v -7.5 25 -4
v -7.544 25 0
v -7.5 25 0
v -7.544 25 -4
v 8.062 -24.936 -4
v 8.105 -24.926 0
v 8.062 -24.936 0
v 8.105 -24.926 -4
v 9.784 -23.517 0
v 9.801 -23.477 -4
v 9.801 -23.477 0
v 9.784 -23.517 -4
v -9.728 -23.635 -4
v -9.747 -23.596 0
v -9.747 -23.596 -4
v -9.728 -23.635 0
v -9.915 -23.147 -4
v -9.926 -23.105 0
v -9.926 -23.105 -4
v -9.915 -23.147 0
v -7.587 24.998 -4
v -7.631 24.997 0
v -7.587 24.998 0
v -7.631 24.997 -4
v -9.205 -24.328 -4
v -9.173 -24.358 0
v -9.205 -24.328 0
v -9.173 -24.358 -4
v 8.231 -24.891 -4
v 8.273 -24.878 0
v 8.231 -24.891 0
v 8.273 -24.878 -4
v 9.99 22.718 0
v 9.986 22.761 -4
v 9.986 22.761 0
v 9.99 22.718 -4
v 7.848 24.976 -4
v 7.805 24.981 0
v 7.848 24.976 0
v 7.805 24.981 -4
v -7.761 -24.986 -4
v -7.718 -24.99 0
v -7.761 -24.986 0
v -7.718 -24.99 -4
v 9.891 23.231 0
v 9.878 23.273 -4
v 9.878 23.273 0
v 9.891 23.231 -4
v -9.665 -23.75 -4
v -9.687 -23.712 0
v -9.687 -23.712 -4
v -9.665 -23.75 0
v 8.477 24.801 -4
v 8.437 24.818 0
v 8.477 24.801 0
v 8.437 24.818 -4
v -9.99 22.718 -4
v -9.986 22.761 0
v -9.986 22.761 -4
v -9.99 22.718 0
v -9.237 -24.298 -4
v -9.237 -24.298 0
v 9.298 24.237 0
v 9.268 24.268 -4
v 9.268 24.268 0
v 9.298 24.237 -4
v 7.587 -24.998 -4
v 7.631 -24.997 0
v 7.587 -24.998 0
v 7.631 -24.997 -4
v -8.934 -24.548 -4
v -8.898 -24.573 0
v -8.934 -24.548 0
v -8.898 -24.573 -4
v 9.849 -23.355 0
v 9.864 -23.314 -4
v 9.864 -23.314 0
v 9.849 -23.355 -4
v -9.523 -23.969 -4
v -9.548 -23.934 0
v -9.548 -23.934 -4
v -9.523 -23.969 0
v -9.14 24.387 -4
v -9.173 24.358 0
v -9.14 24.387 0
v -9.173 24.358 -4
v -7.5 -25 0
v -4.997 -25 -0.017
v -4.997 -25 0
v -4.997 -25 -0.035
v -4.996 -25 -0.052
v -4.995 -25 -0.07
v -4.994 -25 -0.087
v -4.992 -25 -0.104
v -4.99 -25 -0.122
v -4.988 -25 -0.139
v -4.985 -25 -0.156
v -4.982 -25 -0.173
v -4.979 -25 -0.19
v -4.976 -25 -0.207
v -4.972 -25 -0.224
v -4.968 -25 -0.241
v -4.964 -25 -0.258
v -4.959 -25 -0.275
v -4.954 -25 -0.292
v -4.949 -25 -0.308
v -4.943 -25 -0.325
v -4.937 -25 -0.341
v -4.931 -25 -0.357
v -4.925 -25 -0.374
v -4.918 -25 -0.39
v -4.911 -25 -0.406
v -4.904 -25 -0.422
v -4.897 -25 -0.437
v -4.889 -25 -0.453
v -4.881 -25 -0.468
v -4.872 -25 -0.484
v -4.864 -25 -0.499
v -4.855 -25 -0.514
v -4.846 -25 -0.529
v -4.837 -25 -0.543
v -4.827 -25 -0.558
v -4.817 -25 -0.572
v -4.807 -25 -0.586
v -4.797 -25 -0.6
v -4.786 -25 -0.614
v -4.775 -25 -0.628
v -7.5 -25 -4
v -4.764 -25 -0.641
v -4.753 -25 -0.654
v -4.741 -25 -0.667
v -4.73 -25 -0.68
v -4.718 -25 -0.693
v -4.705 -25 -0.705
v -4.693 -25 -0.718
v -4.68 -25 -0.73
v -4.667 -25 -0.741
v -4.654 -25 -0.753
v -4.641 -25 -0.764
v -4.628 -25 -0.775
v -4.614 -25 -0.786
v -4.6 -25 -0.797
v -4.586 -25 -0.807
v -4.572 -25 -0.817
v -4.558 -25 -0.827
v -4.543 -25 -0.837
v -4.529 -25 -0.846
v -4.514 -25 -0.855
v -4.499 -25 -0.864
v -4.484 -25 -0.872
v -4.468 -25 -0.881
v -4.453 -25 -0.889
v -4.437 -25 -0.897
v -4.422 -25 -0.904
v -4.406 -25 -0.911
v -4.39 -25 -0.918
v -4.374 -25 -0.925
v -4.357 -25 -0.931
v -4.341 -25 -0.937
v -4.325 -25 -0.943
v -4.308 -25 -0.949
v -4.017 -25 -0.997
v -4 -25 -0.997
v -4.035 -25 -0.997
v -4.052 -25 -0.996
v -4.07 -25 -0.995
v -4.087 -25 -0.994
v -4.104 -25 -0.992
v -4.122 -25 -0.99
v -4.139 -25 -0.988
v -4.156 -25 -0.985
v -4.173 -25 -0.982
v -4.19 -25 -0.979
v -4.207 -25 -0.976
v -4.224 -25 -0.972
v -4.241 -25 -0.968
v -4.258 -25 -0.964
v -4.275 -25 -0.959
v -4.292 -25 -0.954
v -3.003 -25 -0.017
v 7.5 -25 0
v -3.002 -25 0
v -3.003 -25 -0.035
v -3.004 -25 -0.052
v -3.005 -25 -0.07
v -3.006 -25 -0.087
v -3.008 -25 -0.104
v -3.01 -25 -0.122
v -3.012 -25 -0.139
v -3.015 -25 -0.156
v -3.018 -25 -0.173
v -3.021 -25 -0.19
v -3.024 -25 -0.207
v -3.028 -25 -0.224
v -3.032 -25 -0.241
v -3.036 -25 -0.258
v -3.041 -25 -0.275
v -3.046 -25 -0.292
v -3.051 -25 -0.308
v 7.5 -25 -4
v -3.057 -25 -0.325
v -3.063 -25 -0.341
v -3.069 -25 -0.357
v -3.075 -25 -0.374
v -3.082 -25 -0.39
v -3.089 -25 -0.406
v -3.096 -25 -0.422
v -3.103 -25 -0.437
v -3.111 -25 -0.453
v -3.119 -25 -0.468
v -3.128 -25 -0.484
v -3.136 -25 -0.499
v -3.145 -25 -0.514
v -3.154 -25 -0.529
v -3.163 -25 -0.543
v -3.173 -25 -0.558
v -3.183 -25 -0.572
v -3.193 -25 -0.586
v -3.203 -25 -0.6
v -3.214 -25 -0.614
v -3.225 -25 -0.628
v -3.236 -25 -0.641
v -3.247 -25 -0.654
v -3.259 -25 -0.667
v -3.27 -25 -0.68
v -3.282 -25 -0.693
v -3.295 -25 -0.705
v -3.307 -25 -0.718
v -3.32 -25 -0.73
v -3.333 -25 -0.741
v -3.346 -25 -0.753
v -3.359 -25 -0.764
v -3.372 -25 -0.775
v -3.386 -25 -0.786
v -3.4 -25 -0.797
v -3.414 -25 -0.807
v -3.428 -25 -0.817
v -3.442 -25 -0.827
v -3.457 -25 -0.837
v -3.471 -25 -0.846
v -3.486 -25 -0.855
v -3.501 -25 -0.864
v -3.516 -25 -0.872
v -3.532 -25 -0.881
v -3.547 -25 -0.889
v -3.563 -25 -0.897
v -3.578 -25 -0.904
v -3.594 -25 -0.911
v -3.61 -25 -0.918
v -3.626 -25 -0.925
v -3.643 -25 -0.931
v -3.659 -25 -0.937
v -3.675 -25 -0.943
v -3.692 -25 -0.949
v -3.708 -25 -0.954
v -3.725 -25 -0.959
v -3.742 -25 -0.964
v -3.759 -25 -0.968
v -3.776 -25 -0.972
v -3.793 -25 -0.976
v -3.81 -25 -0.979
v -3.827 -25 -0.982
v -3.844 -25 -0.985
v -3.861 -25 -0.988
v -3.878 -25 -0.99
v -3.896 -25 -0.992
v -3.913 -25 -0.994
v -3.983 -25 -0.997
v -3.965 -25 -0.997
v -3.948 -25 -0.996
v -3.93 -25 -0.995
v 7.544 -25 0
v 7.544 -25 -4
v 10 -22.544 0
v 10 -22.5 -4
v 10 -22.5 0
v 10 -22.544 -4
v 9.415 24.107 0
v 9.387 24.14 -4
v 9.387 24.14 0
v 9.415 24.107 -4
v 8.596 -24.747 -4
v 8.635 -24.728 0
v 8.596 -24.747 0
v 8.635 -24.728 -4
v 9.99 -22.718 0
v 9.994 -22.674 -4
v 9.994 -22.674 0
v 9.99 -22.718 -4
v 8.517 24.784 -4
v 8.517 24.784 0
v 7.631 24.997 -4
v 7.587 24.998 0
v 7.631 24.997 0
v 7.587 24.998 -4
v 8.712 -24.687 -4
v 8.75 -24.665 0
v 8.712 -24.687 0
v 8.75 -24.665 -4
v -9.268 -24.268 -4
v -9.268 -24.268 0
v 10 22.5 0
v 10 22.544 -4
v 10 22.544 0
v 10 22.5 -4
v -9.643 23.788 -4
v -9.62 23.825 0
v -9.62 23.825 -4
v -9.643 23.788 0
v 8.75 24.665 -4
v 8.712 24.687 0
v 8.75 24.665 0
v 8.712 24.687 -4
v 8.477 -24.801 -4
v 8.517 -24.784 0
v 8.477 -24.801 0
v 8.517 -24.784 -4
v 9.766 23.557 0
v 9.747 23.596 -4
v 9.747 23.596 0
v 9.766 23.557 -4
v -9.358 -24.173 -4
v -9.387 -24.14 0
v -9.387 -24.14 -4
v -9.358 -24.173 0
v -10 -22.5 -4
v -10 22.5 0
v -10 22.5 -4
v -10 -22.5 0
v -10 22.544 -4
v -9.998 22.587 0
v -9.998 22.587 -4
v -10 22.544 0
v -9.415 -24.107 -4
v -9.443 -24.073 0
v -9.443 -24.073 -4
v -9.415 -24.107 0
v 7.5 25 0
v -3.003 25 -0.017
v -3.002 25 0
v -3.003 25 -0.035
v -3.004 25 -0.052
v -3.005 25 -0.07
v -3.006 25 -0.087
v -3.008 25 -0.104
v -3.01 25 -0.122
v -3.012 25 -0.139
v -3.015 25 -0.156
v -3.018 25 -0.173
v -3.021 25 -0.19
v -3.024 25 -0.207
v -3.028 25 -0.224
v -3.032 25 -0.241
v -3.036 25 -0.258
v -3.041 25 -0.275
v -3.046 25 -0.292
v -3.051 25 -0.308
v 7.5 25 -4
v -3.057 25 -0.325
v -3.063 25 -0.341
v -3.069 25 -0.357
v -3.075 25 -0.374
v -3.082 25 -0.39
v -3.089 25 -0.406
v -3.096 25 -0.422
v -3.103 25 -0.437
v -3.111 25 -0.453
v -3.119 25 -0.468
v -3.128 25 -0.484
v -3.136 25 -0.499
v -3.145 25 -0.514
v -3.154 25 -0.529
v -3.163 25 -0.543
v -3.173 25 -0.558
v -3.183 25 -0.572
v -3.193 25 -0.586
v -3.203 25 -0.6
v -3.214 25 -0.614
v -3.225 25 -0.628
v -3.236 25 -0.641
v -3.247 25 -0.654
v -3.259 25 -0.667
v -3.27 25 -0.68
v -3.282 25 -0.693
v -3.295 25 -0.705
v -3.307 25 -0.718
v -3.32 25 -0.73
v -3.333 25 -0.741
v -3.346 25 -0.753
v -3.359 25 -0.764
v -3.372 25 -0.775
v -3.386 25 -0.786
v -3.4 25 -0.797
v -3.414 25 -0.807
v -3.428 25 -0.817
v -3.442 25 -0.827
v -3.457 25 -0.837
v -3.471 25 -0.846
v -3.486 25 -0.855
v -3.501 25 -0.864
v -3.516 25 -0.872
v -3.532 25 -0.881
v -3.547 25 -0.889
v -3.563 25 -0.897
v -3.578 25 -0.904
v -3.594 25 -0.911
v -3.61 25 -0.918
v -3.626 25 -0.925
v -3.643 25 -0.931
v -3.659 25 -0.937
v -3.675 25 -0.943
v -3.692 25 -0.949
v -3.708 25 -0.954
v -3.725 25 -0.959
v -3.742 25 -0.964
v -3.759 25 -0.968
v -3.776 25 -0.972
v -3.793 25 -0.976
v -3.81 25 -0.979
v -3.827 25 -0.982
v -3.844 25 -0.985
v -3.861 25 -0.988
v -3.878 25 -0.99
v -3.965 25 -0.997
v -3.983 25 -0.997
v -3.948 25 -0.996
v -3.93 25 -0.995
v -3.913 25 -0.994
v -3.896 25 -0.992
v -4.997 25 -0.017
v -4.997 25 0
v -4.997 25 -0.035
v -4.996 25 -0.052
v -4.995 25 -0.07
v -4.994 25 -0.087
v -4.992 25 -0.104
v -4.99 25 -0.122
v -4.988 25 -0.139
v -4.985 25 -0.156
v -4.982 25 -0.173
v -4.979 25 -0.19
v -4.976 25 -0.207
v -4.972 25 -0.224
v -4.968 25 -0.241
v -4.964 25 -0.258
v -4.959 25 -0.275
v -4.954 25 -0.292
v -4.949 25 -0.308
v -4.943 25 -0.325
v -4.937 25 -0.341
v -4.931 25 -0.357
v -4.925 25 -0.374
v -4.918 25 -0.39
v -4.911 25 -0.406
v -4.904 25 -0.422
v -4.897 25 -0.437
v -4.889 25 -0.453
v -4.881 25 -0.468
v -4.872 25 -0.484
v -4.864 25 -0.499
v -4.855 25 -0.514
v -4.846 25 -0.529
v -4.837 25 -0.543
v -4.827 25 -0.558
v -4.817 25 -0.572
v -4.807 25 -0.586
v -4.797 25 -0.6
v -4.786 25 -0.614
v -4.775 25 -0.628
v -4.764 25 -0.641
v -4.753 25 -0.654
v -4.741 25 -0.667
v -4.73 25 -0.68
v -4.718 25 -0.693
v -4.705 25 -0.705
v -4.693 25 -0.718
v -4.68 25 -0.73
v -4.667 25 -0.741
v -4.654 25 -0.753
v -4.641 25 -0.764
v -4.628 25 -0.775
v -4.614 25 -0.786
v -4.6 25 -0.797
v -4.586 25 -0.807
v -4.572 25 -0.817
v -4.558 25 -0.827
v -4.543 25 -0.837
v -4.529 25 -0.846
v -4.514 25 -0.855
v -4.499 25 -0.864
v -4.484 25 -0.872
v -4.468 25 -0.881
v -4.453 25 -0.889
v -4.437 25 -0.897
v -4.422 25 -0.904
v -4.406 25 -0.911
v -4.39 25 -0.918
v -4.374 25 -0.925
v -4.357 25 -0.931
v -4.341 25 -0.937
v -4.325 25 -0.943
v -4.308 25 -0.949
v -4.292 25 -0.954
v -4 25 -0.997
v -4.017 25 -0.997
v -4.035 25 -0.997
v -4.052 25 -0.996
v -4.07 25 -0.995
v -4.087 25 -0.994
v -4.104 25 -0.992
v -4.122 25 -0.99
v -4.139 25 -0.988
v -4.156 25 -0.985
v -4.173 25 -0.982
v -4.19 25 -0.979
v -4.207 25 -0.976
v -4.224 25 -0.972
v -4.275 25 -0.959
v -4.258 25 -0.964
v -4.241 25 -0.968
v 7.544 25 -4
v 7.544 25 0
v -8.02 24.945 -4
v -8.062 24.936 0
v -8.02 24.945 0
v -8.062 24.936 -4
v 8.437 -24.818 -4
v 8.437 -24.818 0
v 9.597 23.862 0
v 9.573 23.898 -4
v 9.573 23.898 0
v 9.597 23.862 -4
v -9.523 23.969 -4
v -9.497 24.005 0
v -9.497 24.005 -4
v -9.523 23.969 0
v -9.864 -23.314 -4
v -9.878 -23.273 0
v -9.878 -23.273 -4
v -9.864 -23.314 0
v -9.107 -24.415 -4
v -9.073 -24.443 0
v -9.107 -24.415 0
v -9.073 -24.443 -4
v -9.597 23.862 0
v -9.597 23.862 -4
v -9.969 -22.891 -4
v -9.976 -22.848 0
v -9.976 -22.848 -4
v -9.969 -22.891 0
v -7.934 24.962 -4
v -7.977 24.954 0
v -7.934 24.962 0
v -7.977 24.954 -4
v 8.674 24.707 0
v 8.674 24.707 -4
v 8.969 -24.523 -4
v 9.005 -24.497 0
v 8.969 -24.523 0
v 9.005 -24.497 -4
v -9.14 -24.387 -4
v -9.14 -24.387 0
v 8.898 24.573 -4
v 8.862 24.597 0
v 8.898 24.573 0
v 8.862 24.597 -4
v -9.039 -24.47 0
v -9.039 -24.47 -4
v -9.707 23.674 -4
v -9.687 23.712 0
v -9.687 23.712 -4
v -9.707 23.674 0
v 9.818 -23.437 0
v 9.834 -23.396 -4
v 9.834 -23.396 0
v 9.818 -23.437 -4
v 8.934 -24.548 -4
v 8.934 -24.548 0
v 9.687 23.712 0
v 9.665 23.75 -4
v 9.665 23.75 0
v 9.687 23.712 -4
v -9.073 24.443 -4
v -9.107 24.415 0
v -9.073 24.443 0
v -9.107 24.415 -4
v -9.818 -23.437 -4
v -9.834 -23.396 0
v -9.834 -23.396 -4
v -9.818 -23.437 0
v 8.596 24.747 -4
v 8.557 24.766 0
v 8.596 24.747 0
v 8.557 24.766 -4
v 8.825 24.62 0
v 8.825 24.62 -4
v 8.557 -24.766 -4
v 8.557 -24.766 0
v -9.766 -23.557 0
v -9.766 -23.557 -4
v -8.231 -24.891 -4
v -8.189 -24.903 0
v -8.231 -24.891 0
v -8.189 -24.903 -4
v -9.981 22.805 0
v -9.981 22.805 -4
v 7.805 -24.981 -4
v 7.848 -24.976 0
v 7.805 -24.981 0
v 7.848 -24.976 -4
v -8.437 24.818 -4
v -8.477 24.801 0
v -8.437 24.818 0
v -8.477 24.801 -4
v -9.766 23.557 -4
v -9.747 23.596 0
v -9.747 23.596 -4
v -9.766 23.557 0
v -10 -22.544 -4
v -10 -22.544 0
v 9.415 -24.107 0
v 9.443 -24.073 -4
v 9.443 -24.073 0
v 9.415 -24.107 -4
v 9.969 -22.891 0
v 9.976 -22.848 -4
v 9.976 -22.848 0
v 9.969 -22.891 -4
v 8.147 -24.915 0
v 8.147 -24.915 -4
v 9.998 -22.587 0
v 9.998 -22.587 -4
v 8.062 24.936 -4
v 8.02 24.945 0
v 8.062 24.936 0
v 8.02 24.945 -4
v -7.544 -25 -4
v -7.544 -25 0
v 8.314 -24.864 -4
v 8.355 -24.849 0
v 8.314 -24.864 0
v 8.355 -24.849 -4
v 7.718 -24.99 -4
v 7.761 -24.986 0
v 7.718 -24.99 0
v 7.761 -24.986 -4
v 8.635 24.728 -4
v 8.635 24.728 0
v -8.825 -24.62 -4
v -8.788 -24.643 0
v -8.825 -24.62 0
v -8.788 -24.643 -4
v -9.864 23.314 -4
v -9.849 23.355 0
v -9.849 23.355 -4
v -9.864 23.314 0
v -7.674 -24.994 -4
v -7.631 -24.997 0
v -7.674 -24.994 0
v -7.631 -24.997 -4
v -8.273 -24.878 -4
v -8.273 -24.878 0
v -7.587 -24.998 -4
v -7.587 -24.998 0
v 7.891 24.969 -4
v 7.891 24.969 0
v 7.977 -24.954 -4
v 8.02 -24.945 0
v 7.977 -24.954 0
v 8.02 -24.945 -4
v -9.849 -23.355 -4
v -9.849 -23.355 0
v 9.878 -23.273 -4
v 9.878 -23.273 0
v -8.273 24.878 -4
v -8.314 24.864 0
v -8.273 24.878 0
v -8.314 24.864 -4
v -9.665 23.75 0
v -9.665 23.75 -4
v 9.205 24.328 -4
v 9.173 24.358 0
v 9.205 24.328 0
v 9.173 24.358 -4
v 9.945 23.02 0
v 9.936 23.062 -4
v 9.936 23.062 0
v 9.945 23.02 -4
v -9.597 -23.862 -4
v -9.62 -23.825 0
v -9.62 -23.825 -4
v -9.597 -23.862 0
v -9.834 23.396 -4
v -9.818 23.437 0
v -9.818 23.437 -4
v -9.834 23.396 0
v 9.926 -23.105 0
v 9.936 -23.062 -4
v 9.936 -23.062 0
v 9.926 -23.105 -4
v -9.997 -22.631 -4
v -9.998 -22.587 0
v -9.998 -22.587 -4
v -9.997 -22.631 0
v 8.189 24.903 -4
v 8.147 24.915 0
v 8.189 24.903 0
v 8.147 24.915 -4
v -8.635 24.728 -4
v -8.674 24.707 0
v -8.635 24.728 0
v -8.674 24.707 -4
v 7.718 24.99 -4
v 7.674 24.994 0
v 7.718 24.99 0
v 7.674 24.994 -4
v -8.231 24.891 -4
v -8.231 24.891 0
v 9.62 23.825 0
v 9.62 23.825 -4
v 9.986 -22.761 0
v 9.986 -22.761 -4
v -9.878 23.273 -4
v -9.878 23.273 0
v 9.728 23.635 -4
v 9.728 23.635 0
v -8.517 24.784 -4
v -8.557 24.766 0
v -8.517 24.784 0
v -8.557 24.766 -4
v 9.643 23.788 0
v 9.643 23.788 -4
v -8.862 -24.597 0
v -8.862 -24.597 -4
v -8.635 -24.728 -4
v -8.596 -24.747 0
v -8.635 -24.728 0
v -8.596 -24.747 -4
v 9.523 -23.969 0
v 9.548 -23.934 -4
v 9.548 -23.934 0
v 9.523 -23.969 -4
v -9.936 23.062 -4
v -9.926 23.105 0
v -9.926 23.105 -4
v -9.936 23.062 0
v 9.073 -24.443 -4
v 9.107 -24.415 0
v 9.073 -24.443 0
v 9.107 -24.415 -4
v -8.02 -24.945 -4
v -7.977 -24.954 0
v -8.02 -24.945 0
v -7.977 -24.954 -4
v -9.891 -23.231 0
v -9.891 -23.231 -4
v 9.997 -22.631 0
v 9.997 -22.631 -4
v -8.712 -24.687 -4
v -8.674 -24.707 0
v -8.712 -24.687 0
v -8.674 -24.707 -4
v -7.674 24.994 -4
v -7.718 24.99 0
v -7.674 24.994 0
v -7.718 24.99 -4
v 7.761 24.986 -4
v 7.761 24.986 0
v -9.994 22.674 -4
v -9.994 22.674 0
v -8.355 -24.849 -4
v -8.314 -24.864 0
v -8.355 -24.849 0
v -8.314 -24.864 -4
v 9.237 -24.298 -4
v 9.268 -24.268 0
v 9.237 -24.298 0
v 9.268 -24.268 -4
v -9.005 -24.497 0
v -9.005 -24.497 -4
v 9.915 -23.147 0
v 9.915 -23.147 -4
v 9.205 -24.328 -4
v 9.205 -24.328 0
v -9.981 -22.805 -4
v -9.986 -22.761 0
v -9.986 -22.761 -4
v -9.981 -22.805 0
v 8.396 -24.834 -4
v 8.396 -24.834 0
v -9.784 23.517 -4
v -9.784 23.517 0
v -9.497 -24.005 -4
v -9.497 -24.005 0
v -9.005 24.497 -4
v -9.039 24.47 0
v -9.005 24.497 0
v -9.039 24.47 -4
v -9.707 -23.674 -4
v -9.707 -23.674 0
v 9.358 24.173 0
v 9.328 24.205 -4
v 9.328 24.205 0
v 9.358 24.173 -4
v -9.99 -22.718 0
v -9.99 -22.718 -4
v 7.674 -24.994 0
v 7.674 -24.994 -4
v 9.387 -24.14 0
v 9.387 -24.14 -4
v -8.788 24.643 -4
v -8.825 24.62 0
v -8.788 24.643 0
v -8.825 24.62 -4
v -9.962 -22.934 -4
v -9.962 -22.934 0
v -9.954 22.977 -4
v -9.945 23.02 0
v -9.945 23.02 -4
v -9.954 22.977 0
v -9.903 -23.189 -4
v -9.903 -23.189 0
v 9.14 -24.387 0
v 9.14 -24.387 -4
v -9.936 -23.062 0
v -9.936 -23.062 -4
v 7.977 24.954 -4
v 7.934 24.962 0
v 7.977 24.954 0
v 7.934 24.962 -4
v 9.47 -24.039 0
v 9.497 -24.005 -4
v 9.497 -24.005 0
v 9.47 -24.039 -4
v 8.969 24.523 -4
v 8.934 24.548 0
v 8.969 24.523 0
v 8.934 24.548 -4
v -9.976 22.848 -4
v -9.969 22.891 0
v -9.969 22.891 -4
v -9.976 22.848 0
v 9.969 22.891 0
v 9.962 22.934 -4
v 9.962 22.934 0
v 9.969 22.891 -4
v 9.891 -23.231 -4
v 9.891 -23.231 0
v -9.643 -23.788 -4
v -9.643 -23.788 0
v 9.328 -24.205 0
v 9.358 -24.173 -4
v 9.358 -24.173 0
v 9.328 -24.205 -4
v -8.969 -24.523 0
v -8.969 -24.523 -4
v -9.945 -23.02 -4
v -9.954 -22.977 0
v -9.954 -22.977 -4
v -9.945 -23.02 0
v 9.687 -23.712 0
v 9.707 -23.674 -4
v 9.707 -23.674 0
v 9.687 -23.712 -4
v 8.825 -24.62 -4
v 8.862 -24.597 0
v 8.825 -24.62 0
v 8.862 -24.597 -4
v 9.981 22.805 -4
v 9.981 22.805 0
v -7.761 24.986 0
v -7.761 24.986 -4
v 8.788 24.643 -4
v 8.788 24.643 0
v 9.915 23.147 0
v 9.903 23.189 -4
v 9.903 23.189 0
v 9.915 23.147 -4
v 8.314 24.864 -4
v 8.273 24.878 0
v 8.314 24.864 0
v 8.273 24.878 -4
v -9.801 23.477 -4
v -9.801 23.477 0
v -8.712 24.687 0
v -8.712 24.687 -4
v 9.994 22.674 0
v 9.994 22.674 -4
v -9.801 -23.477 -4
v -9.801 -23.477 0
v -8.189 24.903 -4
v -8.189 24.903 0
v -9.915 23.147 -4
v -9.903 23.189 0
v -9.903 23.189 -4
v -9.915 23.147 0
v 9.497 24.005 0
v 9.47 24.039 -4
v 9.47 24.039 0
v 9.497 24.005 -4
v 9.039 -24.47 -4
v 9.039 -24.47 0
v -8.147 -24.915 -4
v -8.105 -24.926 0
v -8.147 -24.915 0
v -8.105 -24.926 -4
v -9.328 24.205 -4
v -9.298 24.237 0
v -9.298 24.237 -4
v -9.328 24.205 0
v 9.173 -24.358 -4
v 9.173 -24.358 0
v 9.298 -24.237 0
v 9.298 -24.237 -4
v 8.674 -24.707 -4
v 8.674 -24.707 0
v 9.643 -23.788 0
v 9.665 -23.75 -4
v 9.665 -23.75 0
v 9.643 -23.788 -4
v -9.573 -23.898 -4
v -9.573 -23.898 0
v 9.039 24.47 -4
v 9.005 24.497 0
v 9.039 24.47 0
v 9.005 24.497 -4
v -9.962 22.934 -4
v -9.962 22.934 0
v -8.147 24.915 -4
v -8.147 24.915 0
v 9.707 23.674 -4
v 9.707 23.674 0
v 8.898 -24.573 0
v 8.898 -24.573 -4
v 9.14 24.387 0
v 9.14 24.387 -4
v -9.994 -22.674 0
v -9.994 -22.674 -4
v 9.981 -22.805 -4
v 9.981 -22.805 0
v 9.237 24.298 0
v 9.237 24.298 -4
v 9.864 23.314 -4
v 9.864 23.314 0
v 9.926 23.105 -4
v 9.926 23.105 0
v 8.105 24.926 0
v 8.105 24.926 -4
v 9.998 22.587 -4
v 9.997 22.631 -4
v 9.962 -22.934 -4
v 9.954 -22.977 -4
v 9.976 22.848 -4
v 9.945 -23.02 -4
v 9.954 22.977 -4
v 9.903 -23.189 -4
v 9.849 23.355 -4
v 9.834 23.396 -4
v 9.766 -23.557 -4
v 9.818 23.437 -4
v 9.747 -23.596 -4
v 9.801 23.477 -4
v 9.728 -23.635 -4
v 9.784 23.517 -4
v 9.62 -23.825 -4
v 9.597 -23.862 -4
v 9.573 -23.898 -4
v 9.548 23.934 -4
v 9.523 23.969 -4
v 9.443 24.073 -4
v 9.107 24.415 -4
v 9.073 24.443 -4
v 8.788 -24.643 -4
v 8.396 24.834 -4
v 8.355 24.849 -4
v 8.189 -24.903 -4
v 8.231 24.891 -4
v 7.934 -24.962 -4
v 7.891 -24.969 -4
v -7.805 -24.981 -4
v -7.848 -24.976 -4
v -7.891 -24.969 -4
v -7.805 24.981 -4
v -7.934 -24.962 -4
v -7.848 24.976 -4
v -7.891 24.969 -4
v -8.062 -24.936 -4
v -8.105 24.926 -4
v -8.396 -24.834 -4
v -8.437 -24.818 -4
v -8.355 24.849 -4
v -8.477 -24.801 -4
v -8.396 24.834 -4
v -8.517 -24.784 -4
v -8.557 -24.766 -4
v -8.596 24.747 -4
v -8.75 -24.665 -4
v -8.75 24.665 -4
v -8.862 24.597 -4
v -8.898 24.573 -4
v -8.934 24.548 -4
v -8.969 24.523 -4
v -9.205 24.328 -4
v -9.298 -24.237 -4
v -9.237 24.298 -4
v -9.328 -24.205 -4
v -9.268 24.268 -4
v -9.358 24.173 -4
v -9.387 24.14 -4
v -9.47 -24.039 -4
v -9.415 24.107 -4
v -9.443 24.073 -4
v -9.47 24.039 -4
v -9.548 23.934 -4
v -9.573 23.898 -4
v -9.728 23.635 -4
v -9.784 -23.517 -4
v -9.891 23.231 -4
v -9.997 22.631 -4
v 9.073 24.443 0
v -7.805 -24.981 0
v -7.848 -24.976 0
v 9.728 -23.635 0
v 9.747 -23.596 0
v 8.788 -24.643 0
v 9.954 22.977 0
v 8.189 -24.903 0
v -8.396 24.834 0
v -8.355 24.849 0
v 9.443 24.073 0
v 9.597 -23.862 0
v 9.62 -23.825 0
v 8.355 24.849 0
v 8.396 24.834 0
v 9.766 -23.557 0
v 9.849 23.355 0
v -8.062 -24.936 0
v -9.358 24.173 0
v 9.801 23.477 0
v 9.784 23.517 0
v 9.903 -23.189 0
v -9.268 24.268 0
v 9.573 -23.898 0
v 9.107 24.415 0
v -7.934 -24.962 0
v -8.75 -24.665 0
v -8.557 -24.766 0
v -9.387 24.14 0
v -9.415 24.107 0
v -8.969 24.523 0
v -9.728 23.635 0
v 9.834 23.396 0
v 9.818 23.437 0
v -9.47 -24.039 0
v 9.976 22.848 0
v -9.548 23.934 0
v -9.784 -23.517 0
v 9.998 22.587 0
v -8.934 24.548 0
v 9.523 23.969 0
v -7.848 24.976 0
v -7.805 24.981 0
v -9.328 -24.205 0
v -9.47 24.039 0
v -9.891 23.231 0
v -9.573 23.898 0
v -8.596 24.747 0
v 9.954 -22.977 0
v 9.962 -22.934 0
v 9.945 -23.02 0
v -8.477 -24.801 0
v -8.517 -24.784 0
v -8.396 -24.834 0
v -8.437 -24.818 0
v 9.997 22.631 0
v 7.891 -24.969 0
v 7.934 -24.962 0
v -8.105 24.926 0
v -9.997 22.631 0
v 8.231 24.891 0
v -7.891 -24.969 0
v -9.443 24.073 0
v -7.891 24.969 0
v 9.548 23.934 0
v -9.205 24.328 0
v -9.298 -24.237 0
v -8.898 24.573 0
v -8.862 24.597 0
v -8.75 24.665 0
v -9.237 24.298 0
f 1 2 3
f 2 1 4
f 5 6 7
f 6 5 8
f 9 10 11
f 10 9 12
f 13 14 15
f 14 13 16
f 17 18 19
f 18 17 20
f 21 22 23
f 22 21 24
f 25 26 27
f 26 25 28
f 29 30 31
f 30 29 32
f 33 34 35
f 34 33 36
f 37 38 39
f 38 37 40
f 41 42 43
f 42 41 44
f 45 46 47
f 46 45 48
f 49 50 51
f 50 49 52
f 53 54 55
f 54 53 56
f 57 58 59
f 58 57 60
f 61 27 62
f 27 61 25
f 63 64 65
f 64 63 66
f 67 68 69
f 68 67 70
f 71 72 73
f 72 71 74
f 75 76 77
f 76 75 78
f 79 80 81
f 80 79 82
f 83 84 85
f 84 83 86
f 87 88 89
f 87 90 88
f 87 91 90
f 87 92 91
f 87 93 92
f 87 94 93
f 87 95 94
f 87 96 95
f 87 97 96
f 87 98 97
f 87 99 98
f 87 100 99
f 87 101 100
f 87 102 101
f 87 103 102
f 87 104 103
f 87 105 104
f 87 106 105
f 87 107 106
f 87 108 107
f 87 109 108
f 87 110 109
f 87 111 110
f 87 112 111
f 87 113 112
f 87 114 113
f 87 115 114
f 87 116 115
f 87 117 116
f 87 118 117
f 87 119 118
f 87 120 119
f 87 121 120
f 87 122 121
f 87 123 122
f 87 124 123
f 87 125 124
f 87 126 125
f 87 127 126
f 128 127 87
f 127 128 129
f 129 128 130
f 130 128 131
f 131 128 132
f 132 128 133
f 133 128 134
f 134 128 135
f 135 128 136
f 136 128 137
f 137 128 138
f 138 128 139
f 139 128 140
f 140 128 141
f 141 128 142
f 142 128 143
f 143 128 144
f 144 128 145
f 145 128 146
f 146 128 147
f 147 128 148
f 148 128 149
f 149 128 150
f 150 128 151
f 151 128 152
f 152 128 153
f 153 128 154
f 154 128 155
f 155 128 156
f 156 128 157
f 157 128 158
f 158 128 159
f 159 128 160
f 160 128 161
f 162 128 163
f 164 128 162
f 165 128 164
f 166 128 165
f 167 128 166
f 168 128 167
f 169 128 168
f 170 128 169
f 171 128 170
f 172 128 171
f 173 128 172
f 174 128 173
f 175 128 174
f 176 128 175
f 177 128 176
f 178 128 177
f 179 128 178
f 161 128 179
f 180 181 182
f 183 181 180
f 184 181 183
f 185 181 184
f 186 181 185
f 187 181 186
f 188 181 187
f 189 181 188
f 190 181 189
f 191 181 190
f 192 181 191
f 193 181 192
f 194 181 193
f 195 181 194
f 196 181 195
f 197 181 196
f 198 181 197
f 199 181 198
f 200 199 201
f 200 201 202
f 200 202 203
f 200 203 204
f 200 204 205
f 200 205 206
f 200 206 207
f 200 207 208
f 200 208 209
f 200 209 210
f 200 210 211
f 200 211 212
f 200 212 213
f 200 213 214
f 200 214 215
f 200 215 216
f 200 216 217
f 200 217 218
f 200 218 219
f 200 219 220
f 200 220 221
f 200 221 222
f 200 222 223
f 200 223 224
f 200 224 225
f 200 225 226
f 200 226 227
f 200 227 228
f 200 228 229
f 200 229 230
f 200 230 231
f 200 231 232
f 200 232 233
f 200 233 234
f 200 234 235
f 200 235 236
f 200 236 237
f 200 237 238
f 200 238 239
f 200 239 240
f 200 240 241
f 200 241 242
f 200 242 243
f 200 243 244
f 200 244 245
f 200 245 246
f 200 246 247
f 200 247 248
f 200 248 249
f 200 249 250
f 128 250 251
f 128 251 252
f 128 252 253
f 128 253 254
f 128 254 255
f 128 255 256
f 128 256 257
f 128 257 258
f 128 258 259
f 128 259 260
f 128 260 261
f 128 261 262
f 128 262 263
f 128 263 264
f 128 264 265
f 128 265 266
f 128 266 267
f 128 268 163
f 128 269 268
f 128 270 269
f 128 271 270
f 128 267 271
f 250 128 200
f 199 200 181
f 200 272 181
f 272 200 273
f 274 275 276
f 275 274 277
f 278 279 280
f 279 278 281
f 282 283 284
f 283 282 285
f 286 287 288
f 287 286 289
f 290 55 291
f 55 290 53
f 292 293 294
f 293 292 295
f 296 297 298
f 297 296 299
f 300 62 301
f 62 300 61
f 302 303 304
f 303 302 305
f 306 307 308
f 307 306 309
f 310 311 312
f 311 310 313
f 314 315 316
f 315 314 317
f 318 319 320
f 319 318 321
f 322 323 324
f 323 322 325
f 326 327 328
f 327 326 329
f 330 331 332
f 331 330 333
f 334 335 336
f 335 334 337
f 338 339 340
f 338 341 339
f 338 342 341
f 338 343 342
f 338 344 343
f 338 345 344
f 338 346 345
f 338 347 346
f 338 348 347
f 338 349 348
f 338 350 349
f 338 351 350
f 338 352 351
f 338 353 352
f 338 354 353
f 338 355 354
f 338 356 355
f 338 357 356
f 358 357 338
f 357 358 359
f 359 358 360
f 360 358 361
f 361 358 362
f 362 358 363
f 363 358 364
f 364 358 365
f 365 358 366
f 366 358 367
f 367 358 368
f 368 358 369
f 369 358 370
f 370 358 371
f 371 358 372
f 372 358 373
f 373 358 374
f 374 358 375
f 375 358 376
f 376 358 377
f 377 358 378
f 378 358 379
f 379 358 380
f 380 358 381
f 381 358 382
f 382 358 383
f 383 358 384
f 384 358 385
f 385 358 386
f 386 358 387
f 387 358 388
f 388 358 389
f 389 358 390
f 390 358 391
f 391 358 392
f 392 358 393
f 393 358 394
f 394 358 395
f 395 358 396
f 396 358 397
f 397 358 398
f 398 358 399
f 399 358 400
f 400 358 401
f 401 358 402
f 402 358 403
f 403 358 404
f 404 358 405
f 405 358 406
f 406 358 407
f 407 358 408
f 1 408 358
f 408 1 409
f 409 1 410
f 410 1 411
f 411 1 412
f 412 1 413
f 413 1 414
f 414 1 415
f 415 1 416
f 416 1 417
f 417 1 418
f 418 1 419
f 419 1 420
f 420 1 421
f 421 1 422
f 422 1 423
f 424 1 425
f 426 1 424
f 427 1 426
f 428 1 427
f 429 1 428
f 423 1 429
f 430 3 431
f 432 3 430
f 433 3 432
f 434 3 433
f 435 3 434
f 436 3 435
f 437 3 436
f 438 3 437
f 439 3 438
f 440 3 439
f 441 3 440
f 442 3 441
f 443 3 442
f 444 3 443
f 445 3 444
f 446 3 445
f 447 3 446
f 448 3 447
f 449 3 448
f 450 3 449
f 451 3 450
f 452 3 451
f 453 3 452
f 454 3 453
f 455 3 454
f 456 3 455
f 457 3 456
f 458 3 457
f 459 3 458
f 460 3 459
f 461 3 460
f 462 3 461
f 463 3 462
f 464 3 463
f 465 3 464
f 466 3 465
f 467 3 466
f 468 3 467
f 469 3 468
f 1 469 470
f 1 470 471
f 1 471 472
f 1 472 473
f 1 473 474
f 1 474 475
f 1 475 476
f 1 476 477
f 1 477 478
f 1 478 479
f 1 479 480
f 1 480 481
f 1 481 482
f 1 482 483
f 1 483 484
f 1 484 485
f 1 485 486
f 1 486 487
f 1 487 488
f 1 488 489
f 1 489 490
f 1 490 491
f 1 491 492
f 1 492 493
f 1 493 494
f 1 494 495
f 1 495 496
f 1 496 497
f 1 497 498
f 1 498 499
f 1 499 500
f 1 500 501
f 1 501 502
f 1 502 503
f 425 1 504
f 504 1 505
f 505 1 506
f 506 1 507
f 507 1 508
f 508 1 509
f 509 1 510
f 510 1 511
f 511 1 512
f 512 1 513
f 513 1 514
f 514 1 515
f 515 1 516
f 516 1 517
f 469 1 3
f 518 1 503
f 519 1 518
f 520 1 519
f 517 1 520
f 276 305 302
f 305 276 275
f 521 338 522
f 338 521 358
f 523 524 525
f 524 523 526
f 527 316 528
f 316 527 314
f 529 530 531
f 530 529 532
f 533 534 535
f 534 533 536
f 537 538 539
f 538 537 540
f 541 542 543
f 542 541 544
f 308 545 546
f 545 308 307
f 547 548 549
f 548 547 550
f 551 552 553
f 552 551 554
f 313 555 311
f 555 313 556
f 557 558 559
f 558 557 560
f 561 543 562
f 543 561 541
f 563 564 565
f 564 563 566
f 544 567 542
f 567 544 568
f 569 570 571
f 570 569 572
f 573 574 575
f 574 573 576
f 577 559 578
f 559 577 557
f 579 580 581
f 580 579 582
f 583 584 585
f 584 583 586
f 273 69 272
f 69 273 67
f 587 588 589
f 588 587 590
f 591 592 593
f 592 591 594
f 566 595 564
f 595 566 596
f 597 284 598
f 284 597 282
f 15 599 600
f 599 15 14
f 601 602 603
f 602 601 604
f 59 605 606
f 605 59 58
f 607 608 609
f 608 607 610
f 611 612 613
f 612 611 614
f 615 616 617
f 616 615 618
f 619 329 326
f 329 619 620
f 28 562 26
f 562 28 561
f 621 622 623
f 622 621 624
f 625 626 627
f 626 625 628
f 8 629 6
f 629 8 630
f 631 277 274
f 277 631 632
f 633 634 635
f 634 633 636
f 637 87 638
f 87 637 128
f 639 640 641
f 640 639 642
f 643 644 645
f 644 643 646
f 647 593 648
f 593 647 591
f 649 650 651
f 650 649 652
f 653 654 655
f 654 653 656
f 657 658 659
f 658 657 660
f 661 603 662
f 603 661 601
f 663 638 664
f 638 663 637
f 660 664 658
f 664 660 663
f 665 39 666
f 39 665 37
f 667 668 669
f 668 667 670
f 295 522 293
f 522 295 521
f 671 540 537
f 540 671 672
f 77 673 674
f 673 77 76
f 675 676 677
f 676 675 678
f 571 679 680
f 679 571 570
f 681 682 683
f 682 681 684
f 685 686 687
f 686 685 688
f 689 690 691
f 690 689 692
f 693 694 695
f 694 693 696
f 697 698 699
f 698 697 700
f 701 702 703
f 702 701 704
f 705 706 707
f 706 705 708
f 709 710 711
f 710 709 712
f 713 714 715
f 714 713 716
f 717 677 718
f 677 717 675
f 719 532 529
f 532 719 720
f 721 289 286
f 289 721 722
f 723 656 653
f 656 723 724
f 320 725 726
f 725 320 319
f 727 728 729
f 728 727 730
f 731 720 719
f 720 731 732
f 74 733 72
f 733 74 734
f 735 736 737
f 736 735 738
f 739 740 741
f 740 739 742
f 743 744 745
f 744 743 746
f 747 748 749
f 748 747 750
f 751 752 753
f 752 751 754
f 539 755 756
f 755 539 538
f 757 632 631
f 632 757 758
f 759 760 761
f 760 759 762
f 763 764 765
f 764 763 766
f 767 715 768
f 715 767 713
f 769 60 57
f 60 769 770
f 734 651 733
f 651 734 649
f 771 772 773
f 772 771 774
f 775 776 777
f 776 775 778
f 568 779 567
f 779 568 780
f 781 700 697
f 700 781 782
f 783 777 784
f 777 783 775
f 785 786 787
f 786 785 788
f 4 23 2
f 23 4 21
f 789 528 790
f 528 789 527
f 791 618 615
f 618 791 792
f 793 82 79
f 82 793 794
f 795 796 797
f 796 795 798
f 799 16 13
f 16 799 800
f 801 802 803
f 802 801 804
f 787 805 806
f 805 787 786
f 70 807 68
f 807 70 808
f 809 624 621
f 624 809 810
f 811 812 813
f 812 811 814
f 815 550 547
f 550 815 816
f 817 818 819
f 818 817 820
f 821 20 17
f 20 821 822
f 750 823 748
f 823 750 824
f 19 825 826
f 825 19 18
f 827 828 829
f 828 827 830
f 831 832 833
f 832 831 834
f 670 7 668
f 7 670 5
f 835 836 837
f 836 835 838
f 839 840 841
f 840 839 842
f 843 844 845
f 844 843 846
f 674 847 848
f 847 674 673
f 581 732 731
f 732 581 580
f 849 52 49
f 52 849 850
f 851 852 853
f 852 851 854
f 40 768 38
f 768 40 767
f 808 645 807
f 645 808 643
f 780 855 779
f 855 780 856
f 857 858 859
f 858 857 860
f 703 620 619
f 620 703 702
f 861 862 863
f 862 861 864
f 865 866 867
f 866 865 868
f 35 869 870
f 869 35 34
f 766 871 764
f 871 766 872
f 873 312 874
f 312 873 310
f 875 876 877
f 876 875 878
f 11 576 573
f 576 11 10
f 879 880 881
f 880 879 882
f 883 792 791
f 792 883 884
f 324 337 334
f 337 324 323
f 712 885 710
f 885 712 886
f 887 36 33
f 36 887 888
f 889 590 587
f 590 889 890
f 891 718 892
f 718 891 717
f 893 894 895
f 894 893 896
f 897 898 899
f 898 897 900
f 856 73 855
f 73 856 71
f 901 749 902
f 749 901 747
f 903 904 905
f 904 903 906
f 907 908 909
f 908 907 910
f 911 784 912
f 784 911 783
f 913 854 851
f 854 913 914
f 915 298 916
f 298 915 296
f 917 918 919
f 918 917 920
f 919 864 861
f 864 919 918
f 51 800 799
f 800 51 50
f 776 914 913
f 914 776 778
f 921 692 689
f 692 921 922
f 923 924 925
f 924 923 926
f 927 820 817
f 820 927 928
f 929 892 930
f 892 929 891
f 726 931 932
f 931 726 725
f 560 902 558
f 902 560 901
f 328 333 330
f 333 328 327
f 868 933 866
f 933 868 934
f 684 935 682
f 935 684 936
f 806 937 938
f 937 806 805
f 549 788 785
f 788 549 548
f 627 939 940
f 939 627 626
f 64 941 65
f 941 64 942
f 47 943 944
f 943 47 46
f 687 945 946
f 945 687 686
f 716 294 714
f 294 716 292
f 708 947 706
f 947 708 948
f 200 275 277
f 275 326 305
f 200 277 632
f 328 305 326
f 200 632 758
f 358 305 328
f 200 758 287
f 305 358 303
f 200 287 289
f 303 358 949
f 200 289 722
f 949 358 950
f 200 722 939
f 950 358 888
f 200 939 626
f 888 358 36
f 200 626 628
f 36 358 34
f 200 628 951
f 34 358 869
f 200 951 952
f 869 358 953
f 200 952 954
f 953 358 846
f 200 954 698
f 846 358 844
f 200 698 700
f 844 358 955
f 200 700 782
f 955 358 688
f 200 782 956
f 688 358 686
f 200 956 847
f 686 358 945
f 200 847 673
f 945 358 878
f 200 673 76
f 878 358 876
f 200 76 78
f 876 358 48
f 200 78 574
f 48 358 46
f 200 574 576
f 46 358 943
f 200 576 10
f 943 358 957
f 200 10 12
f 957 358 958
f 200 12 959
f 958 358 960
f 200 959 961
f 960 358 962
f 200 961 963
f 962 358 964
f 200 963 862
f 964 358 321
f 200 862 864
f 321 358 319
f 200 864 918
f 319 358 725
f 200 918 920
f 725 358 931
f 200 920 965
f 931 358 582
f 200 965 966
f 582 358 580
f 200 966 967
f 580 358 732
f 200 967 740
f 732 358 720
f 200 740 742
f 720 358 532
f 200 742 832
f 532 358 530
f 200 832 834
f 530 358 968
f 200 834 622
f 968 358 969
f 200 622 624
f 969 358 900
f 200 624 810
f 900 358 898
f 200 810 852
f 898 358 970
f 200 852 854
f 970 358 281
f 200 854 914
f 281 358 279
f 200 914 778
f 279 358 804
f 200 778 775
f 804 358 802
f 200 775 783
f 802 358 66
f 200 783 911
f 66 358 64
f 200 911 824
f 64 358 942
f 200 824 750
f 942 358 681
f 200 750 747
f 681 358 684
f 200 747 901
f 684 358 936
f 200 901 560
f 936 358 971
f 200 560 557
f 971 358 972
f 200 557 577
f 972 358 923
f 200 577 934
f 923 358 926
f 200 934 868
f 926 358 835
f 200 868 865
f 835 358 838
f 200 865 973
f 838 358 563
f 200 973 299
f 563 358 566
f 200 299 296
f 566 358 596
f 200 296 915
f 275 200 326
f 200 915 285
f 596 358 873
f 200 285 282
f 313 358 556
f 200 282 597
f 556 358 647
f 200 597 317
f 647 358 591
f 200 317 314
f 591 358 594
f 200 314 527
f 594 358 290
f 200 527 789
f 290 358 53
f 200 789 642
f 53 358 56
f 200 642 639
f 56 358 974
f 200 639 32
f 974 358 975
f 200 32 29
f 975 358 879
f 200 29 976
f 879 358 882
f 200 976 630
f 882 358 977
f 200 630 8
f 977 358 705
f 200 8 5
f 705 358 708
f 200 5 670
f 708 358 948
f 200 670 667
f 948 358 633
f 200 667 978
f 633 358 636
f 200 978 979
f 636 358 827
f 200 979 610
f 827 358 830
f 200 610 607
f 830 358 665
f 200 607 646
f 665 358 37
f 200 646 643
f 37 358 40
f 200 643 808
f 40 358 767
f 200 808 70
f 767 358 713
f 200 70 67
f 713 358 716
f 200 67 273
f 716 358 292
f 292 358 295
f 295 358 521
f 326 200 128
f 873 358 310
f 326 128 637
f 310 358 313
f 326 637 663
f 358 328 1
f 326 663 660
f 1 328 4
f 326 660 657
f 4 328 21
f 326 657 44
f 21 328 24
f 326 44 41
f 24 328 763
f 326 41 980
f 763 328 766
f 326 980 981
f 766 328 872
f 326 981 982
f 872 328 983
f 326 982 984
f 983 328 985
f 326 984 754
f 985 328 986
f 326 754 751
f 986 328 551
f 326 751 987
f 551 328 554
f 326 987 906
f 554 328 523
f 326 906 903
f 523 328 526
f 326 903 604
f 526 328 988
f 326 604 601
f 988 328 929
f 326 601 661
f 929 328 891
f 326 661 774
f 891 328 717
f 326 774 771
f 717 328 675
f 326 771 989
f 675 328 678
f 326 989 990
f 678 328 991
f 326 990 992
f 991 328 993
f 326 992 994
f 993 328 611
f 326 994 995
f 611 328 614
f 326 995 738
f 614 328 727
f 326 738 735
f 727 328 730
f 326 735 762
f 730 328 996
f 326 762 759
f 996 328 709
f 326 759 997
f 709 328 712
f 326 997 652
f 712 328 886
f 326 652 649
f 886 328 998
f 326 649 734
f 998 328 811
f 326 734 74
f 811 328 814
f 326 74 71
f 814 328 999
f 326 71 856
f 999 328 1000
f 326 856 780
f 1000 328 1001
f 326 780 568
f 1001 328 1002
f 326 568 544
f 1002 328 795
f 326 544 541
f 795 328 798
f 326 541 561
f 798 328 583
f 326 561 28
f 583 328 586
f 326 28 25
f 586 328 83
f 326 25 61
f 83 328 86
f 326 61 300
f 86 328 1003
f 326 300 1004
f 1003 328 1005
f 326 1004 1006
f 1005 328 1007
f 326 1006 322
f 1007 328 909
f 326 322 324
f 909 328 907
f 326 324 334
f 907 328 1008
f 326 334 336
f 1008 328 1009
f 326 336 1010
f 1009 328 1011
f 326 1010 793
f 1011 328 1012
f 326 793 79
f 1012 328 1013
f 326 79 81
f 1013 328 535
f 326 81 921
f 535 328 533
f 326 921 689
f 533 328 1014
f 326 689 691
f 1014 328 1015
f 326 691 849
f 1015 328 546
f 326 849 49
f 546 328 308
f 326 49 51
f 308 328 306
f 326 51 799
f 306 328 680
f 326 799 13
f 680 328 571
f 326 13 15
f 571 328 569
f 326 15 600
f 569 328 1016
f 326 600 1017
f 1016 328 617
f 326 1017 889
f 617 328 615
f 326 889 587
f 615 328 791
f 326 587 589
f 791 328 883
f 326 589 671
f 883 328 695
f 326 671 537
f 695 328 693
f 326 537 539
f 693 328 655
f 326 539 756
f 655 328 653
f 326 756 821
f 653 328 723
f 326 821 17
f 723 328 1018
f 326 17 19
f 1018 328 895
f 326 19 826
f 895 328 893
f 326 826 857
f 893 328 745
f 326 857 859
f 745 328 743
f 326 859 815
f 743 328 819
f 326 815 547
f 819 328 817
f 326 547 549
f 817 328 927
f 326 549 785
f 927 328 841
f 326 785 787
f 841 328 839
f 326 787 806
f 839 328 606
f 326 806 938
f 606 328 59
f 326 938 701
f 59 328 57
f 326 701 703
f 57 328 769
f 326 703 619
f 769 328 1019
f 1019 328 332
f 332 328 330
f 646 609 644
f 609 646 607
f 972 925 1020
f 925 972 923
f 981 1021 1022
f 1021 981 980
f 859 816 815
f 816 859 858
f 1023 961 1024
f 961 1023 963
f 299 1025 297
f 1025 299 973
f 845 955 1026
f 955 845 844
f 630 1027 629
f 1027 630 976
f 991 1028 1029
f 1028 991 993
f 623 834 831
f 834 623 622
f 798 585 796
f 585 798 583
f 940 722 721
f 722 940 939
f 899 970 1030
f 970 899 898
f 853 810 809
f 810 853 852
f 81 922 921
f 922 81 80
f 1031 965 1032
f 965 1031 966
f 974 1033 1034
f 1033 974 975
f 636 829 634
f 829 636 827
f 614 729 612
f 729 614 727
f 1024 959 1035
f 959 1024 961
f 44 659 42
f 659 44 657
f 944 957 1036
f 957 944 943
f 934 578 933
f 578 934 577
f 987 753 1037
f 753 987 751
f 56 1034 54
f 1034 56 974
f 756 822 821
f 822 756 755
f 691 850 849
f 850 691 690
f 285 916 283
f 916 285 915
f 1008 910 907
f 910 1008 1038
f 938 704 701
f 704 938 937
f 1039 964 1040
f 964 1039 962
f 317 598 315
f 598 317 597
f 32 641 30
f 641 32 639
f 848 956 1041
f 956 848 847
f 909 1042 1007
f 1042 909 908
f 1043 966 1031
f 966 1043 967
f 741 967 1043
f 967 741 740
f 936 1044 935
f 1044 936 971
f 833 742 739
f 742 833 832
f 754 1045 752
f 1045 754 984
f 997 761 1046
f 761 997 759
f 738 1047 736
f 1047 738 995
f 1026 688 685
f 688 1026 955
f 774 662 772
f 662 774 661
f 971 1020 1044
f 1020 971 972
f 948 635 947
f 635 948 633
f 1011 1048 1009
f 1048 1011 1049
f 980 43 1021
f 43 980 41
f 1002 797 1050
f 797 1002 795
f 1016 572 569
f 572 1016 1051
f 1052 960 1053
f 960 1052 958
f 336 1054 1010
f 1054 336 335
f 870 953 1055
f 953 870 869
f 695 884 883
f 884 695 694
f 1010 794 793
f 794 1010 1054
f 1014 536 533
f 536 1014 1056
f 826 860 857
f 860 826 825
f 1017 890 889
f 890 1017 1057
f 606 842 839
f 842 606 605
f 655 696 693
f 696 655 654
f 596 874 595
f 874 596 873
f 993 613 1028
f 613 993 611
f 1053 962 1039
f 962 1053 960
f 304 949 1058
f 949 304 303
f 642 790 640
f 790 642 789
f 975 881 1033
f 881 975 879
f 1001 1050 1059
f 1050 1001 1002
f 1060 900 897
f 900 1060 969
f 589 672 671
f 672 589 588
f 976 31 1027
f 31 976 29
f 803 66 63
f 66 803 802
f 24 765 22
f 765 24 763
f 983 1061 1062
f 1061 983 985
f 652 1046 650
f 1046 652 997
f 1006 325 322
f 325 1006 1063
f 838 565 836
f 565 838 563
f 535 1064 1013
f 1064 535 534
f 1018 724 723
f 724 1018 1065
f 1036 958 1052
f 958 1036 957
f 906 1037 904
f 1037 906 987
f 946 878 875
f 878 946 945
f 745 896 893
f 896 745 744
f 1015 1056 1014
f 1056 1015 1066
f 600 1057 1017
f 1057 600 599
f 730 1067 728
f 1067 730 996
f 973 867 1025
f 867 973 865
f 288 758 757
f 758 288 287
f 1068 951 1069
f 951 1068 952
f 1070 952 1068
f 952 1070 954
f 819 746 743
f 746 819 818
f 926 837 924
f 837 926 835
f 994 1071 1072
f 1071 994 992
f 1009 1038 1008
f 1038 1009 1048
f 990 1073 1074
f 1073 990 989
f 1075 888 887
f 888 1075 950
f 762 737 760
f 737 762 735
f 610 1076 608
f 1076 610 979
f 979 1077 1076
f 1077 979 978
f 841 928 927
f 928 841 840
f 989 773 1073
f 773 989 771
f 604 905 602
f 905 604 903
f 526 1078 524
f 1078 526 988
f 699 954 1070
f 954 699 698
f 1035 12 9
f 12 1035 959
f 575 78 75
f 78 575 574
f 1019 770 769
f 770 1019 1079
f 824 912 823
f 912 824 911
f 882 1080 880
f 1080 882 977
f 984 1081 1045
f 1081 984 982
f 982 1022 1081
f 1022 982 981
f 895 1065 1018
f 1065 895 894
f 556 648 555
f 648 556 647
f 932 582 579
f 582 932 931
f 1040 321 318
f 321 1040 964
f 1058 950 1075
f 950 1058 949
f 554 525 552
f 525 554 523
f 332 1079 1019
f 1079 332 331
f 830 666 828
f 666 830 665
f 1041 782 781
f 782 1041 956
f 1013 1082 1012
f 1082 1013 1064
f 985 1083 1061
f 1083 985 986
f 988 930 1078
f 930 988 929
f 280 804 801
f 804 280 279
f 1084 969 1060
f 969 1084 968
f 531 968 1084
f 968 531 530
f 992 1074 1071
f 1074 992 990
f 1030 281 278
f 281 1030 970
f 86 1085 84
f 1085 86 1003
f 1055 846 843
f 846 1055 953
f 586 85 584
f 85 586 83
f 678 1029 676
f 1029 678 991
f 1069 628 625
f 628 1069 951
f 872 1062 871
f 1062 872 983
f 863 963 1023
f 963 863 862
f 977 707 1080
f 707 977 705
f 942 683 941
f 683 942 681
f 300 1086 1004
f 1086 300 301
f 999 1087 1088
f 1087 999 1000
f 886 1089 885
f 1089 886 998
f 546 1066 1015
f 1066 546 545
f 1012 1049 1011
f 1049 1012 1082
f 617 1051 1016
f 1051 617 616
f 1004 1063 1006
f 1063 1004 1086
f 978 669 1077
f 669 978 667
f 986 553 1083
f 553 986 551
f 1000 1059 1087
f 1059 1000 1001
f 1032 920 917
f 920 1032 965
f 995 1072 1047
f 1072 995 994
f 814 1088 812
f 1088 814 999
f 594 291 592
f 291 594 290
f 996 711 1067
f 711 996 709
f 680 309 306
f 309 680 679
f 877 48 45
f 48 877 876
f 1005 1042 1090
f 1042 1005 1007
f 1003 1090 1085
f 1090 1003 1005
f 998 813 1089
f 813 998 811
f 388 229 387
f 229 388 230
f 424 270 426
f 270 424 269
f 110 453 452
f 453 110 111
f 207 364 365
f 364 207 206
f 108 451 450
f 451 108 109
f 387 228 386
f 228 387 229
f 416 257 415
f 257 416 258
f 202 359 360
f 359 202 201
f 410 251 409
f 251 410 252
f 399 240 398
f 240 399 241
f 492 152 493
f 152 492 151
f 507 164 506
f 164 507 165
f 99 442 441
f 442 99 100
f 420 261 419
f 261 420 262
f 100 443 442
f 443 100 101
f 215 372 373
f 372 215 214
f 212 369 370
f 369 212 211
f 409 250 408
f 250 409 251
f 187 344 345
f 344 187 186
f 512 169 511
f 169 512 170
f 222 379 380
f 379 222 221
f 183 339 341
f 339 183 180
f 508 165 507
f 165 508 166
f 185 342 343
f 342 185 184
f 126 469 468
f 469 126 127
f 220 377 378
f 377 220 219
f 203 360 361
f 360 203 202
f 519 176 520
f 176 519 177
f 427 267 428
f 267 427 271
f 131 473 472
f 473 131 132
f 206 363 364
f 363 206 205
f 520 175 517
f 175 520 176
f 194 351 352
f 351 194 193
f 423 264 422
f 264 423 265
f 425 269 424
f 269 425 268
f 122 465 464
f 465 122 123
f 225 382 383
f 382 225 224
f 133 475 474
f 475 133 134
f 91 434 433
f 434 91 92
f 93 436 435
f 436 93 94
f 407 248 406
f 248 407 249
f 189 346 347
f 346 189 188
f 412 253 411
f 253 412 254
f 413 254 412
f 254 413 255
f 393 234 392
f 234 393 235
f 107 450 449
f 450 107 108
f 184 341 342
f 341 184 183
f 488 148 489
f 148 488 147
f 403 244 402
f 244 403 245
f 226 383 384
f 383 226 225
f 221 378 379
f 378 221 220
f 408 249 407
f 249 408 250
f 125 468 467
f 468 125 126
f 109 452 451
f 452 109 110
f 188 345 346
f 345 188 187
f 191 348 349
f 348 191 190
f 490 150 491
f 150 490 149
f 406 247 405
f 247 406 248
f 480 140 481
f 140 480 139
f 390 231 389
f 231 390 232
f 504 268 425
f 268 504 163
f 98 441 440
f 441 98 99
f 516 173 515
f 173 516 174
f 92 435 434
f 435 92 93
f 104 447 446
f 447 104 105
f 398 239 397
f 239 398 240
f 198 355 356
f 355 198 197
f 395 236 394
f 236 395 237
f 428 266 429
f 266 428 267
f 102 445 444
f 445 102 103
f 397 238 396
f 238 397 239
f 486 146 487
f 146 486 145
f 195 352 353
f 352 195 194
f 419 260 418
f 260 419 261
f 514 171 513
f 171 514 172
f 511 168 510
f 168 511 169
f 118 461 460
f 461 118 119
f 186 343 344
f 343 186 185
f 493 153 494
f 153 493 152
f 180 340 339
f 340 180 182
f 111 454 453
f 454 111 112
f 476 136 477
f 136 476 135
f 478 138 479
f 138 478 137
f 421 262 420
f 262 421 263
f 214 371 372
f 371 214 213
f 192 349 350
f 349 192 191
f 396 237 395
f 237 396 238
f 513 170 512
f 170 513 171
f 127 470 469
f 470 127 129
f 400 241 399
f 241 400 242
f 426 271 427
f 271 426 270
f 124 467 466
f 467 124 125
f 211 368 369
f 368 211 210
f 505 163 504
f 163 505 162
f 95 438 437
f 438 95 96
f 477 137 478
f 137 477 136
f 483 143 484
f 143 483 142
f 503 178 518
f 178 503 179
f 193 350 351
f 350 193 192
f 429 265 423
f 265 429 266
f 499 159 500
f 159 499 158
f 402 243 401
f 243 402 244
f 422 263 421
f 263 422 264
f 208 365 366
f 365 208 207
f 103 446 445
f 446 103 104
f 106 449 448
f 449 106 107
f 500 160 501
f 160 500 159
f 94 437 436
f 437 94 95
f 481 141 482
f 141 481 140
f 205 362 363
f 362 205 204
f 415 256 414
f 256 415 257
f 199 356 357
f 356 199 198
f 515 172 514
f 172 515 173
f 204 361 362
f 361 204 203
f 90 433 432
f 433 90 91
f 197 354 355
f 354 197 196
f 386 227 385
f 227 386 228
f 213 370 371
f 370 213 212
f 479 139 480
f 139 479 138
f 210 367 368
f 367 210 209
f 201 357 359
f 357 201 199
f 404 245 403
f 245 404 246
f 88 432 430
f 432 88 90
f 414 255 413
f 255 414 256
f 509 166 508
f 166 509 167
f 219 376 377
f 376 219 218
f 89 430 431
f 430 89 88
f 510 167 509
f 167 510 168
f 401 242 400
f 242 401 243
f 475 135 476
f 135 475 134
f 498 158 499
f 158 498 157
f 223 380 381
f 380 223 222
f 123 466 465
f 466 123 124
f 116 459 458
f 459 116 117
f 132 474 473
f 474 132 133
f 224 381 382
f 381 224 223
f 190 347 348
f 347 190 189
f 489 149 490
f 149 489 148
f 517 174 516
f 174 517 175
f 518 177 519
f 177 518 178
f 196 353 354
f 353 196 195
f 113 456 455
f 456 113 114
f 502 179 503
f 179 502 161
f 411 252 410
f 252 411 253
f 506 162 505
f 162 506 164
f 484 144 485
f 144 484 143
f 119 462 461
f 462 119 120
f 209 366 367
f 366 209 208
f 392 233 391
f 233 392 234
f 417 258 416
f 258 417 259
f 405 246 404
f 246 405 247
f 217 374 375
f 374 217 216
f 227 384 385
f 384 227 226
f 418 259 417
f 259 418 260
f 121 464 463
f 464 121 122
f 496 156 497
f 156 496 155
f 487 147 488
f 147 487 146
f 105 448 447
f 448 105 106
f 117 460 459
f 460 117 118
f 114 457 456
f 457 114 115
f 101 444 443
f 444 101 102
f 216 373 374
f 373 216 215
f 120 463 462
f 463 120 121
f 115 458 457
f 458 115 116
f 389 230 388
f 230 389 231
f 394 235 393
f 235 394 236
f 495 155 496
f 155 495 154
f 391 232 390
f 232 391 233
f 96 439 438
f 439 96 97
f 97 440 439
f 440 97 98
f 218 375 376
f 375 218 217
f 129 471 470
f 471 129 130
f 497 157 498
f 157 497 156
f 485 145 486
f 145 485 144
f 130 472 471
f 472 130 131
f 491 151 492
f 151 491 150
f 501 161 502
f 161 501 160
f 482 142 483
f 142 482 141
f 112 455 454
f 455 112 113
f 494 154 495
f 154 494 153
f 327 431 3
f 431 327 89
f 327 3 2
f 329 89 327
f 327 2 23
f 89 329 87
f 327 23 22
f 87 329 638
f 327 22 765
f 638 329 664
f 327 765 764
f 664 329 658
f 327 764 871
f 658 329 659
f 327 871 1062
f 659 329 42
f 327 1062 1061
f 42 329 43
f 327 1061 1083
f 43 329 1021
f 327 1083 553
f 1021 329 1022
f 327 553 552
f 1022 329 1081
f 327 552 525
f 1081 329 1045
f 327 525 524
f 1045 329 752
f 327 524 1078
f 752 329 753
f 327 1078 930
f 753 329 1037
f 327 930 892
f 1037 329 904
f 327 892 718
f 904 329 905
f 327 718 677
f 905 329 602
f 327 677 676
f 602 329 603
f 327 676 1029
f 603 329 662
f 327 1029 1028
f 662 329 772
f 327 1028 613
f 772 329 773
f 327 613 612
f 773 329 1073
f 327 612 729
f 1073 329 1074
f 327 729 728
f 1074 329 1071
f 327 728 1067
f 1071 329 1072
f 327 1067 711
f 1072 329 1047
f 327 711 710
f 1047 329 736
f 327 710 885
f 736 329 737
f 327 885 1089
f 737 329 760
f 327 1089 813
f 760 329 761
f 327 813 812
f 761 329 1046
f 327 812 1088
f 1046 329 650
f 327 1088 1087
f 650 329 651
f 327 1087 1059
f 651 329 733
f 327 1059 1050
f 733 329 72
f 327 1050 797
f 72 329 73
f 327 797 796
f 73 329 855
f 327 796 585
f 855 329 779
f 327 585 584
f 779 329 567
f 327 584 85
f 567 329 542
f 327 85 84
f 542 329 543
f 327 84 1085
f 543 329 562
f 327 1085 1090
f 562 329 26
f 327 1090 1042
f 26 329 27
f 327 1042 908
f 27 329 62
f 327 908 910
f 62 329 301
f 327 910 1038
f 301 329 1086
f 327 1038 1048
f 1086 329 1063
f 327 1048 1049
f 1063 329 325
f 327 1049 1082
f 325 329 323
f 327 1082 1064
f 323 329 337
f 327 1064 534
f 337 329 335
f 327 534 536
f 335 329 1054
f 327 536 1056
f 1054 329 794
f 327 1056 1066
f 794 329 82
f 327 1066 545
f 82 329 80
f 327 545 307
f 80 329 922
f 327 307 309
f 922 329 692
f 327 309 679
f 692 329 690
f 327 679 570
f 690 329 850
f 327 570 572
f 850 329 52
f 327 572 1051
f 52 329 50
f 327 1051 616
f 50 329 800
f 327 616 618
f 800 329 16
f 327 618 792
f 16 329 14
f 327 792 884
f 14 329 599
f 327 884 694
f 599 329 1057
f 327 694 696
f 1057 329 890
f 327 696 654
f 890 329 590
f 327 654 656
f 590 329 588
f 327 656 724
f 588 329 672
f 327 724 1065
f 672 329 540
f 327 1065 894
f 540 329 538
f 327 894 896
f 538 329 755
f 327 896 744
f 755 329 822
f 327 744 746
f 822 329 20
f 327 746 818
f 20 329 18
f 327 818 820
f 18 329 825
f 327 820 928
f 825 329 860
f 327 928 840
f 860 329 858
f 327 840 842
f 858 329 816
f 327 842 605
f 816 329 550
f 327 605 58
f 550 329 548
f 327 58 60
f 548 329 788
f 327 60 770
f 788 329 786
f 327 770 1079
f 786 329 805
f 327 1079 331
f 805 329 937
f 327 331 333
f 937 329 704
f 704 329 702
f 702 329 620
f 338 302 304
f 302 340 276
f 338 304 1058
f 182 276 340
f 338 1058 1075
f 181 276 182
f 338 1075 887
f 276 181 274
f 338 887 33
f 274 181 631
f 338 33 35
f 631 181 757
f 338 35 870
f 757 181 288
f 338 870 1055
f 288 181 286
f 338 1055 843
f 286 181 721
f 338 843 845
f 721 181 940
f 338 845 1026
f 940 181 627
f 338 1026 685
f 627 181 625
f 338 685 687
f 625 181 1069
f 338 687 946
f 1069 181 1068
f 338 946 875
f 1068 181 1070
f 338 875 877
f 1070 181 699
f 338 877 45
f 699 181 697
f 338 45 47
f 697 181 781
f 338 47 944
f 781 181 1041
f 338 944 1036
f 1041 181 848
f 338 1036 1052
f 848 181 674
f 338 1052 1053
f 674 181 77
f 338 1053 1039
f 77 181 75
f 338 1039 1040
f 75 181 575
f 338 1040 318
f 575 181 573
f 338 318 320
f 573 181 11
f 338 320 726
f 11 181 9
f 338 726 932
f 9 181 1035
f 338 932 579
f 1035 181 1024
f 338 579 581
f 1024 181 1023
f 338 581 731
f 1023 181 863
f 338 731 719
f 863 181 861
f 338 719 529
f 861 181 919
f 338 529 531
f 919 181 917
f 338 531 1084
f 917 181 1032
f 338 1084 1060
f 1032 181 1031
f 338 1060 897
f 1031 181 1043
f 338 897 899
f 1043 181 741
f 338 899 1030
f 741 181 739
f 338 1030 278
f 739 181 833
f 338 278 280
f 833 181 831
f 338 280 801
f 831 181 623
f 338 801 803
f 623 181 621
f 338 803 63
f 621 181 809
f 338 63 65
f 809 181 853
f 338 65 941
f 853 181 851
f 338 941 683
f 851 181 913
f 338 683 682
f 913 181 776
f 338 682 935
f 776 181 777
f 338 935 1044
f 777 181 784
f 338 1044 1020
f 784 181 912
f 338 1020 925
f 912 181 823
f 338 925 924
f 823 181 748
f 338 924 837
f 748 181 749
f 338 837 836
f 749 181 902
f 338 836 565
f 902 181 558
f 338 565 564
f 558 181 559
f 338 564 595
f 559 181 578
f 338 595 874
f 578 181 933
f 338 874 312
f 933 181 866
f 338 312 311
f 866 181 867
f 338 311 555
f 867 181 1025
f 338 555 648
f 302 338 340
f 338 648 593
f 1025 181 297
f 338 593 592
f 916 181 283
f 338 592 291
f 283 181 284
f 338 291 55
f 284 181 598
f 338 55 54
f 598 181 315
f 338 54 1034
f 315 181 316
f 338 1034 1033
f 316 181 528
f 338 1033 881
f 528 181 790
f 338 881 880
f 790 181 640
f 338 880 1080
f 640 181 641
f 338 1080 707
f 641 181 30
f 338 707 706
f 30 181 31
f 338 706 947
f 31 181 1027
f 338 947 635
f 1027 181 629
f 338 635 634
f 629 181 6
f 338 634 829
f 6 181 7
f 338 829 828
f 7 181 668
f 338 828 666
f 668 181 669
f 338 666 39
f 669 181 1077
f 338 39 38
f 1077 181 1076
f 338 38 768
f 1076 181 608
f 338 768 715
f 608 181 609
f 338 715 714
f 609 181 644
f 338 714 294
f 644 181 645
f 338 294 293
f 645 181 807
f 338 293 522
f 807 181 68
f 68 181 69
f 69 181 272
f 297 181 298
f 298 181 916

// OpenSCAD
echo(version=version());
debug = 1;
explode = $preview ? 0.1 : 0.0;
$fn = $preview ? 90 : 360;
tol = 0.2;

rotate([0,0,0]){
  translate([0,0,0]){ // positioning of the hinge
    filamentGuide();
  }
}

fgWidth =  20; // x-axis
fgLength = 50; // y-axis 
fgHeight =  8; // z-axis
fgRadiusFillet = 2.5;

dFilament = 1.75;

module filamentGuide(){
  difference(){
    union(){
      minkowski(){
        cube([fgWidth-2*fgRadiusFillet, fgLength-2*fgRadiusFillet, fgHeight/2],center = true);
        cylinder(r = fgRadiusFillet, h = fgHeight/2, center = true);
      }
    }
    // Cut out filament path
    translate([-4,0,0]){
      rotate([90,0,0]){
        cylinder(d = dFilament*1.14, h = fgLength+tol, center = true);
      }
    }
    // Cut out filament Bowden tube inserts
    
    // Section analysis, DEBUG == 1
    if (debug == 1){
      translate([0,0,10])
        cube([100, 100, 20],center = true);
    }
  }
}
